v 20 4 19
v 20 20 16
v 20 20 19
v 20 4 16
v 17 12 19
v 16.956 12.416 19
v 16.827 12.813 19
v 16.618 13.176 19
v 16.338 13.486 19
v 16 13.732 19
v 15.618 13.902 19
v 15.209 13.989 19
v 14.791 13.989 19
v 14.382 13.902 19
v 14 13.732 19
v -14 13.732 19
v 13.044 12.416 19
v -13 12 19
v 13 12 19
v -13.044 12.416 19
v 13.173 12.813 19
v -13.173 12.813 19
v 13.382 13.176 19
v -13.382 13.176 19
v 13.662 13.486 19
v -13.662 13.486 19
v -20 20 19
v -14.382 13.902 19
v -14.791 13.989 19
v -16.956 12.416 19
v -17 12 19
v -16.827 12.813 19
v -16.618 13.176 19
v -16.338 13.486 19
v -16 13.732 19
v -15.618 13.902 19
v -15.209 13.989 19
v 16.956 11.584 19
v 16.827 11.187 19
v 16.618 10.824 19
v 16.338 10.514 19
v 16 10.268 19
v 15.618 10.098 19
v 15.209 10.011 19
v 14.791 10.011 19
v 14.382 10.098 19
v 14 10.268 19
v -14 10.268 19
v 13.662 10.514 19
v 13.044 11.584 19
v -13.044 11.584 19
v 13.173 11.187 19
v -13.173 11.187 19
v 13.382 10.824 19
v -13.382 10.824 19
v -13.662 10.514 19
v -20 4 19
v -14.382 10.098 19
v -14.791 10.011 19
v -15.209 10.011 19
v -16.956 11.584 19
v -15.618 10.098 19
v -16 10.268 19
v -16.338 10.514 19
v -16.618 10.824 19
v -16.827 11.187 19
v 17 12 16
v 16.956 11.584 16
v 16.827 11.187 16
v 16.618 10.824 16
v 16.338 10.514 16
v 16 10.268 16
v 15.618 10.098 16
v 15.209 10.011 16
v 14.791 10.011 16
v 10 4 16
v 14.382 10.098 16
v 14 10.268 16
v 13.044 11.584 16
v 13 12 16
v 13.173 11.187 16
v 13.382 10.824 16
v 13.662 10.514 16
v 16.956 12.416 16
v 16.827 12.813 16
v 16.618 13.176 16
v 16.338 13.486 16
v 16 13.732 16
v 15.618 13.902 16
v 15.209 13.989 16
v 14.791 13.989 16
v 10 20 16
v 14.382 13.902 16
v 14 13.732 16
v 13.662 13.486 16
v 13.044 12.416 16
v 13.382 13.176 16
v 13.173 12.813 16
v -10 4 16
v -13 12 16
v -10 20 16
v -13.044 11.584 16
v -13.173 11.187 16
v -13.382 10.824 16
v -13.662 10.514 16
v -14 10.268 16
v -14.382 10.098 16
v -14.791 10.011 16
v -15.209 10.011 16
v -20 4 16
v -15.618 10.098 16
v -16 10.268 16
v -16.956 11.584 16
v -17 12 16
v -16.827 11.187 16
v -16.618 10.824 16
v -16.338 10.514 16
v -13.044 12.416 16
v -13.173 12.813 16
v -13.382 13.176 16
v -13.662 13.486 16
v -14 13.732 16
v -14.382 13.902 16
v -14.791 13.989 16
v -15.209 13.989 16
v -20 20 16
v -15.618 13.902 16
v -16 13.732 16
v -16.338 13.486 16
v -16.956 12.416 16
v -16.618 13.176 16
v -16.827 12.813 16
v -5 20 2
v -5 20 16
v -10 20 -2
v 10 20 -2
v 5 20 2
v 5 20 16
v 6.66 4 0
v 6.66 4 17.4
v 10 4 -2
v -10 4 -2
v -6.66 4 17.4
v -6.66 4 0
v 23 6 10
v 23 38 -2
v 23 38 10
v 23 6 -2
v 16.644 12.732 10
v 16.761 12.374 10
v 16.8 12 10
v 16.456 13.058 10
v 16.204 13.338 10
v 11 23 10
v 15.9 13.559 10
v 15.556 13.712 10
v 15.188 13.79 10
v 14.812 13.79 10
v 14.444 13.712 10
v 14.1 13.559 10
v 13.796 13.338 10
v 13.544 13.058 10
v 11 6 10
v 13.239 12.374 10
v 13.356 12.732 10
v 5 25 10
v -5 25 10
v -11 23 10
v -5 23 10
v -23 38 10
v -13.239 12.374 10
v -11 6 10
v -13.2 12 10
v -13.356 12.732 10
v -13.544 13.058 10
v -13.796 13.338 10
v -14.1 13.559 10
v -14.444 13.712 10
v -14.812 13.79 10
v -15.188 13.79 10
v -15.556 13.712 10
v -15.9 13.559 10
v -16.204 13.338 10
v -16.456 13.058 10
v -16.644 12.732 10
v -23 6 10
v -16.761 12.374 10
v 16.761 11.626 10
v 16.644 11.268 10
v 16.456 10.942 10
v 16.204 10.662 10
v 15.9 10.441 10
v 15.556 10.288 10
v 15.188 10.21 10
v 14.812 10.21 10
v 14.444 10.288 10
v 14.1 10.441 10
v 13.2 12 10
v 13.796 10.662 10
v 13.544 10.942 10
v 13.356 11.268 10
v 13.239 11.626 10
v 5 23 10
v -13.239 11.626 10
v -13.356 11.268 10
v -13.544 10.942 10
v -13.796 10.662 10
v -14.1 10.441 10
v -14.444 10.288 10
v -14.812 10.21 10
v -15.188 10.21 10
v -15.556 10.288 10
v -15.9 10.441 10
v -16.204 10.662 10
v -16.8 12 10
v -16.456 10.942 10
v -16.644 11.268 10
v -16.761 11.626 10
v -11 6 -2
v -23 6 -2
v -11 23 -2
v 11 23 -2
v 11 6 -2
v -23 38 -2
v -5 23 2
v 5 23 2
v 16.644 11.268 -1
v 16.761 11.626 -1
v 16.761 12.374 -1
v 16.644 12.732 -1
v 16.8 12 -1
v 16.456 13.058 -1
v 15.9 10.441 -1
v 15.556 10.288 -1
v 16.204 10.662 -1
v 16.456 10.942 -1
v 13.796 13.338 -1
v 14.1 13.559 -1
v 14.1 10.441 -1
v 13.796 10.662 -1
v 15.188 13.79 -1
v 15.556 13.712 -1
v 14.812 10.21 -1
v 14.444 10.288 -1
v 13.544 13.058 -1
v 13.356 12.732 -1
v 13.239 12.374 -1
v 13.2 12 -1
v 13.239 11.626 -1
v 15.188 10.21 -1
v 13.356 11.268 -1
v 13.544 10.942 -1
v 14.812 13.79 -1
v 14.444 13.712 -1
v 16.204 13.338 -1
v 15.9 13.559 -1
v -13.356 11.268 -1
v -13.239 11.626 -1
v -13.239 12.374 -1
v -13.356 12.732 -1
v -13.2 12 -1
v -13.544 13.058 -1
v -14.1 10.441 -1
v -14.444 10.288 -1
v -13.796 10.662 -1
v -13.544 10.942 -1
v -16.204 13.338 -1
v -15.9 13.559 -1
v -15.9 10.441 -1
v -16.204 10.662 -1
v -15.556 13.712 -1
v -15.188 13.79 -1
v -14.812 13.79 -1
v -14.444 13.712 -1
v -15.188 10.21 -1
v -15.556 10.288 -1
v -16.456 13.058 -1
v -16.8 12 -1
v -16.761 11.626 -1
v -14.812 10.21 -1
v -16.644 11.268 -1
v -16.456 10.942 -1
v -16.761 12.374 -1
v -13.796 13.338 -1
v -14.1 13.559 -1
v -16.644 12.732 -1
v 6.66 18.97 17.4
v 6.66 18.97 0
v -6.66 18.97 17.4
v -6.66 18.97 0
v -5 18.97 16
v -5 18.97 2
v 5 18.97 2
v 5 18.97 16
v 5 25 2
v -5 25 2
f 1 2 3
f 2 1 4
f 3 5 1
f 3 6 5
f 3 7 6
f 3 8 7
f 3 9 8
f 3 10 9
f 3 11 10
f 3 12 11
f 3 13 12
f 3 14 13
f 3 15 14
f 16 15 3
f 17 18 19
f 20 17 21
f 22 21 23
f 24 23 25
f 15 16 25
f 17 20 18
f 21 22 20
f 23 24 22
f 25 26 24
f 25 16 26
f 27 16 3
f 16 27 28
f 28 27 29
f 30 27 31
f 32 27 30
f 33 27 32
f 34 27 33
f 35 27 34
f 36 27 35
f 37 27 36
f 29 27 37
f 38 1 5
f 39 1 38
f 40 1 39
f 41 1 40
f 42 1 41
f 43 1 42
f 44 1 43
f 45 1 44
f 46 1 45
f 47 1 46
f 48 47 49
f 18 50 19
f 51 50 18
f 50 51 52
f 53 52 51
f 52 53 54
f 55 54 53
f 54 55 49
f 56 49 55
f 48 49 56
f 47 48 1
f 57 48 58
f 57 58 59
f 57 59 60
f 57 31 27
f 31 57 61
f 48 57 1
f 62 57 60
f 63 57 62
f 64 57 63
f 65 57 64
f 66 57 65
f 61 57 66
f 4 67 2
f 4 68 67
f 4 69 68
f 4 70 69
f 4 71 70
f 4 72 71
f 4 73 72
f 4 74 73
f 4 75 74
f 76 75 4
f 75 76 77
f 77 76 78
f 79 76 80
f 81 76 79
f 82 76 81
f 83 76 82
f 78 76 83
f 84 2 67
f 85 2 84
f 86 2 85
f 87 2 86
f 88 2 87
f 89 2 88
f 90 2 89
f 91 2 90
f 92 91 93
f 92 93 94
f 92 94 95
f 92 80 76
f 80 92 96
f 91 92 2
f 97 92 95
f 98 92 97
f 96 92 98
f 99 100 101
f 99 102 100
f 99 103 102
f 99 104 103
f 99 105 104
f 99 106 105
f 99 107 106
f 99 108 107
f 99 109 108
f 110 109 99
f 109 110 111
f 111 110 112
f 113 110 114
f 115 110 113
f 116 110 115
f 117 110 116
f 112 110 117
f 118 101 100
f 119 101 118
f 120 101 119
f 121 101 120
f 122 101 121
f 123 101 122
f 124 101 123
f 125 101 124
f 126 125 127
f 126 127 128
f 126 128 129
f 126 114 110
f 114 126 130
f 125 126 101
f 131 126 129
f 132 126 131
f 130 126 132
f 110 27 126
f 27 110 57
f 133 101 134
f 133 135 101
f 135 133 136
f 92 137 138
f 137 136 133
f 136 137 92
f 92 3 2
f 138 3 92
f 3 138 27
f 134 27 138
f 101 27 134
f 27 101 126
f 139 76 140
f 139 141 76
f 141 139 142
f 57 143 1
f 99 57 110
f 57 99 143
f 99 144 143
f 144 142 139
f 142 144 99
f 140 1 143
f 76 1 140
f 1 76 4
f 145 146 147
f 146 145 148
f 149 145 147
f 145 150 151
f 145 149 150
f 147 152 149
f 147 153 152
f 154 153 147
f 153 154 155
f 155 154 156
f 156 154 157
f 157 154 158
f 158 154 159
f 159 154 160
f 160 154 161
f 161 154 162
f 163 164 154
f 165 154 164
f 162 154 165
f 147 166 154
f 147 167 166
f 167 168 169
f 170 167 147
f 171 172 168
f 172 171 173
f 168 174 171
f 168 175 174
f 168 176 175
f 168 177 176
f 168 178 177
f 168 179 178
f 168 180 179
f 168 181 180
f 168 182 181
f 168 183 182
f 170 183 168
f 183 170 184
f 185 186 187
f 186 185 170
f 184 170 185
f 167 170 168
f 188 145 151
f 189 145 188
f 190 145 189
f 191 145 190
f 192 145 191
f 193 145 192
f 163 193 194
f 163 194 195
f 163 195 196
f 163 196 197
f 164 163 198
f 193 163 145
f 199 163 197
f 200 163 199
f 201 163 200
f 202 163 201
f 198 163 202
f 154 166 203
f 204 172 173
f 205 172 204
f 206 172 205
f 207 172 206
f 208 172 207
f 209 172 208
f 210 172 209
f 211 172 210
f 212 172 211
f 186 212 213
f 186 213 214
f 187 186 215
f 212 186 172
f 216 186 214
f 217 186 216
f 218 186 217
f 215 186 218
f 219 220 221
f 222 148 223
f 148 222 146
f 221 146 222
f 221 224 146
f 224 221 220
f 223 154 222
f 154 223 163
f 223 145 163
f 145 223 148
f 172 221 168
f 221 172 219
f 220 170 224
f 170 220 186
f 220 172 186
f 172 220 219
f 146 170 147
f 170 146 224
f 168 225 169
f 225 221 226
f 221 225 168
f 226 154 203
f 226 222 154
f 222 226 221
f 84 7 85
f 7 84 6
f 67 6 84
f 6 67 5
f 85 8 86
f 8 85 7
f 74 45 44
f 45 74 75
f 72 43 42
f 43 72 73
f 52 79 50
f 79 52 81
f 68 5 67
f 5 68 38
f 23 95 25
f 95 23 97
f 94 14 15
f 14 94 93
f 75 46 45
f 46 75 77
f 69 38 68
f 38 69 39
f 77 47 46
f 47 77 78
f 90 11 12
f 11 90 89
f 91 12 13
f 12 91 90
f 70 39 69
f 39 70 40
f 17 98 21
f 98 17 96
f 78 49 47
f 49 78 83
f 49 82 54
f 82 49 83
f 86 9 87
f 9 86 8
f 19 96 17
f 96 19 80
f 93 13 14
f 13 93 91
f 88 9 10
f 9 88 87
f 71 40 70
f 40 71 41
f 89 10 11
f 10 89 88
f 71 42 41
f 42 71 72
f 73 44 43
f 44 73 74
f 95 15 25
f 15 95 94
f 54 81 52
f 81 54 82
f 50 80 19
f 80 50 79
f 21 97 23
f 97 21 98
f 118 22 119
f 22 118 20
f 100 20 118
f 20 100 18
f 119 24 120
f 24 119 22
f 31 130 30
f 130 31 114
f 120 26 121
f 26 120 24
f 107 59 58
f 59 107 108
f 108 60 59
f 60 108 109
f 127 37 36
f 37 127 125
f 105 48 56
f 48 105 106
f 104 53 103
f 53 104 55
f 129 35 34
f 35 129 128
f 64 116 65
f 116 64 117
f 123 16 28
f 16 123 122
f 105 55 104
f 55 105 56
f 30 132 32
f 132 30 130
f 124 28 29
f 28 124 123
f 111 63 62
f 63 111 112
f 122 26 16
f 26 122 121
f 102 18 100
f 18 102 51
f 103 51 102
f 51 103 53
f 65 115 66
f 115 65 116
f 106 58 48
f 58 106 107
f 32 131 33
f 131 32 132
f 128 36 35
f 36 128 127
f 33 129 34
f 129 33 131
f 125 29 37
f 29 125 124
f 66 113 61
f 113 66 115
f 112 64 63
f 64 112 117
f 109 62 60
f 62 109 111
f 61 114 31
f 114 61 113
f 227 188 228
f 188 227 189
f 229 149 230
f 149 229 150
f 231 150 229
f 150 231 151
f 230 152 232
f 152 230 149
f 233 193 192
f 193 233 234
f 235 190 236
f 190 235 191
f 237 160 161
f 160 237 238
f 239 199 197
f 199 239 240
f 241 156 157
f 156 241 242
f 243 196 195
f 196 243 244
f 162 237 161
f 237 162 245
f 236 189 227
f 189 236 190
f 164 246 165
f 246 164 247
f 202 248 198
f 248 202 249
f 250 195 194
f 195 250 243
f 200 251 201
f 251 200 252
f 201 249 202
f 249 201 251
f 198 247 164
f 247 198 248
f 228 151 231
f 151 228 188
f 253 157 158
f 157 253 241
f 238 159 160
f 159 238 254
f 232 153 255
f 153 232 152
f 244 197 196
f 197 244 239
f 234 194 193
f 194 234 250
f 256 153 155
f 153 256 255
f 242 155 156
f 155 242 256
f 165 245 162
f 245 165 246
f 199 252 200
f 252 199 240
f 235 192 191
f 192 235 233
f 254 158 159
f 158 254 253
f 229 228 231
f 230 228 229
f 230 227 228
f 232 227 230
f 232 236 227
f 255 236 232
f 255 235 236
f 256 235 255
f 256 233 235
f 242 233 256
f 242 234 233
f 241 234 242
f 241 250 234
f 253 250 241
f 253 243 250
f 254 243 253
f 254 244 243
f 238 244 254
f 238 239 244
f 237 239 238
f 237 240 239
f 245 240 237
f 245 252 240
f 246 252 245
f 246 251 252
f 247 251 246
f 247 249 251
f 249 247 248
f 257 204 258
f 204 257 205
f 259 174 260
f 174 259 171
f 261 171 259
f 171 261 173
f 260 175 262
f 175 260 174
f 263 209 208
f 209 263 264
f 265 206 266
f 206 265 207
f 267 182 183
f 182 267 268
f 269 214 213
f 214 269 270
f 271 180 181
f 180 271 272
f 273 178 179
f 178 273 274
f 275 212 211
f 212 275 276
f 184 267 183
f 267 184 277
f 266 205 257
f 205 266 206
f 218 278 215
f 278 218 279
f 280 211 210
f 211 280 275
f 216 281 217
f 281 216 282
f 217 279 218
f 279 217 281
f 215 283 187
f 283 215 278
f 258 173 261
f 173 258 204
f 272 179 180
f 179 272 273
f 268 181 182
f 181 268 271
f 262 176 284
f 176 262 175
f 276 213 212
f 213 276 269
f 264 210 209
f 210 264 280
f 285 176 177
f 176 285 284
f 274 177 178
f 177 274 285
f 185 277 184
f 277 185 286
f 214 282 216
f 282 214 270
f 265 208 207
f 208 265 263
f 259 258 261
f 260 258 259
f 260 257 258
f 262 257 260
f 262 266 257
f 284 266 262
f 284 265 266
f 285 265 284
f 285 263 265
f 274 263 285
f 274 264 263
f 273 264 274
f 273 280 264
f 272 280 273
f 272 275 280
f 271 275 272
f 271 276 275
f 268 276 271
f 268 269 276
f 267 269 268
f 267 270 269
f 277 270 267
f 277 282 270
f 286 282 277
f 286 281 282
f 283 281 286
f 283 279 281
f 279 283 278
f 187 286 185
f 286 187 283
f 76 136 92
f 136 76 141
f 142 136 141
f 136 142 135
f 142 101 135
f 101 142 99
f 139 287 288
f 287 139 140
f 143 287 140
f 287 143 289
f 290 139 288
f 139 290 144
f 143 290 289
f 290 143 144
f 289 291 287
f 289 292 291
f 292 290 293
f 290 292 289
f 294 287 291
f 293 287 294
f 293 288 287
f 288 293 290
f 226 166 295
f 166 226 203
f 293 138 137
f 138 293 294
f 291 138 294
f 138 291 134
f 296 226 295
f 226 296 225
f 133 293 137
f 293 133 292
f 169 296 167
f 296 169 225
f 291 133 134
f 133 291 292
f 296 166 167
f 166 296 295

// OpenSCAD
// this is a mount for a Sony quarter inch tape head.
// specifically, for Sony p/n PP30-4202A
// it is a "four track" head with only track 1 and 3 populated (top and 2nd from bottom)

// with the mounting holes on the table, and the side that the tape touches facing you:
// width: 13.32mm
// height: 17.40mm
// depth: 18.97mm
// mounting screws are centered left-to-right, 11.03mm apart front-to-back
// the front mounting screw is centered about 3.5mm back from the tape contact surface

// The most important dimension when using a tapehead is it's vertical height, so that
// the tracks on the head properly align with the tracks on the tape in the transport.
// The second most important dimension is the azimuth alignment. On R2R you can generally
// assume the tape is transported perfectly level due to the tape being bidirectional.
//


module tapehead_bb() {
    translate([-13.32/2, 0,0])
        cube([13.32, 18.97, 17.40]); // bounding box of tapehead
}

module frame() {
    width = 20;
    // how far 'back' the frame starts from the very front of the tapehead bounding box. 
    // Remember, the tape surface is set back itself and needs clearance for the tape to
    // move across it with some slight deflection.
    setback = 4;
    // How far the tape head is lifted above the surface this mount is resting on.
    // Ideally, mechanically adjustable...
    lift = 2;
    translate([-width/2,setback,-lift])
        cube([width, 16, 21]);

    // mounting ears at the top of the frame
    $fs = 0.2;
    difference() {
        union() {
            translate([-20, setback, -lift+21-3])
                cube([40, 16, 3]); // ears
            translate([11, 6, -lift])
                cube([12,18,12]);
            translate([-23, 6, -lift])
                cube([12,18,12]);
            translate([-23, 23, -lift])
                cube([46, 15, 12]);
        }
        translate([15,12,15])
            cylinder(13, d=4); // pass through for positioning screw
        translate([-15,12,15])
            cylinder(13, d=4); // pass through for positioning screw
        translate([15,12,-1])
            cylinder(13, d=3.6); // tapped hole for positioning screw
        translate([-15,12,-1])
            cylinder(13, d=3.6); // tapped hole for positioning screw
    }
}

module wiring_access() {
    translate([-5,10,2])
        cube([10,15,14]);
}

difference() {
    frame();
    tapehead_bb();
    wiring_access();
}
